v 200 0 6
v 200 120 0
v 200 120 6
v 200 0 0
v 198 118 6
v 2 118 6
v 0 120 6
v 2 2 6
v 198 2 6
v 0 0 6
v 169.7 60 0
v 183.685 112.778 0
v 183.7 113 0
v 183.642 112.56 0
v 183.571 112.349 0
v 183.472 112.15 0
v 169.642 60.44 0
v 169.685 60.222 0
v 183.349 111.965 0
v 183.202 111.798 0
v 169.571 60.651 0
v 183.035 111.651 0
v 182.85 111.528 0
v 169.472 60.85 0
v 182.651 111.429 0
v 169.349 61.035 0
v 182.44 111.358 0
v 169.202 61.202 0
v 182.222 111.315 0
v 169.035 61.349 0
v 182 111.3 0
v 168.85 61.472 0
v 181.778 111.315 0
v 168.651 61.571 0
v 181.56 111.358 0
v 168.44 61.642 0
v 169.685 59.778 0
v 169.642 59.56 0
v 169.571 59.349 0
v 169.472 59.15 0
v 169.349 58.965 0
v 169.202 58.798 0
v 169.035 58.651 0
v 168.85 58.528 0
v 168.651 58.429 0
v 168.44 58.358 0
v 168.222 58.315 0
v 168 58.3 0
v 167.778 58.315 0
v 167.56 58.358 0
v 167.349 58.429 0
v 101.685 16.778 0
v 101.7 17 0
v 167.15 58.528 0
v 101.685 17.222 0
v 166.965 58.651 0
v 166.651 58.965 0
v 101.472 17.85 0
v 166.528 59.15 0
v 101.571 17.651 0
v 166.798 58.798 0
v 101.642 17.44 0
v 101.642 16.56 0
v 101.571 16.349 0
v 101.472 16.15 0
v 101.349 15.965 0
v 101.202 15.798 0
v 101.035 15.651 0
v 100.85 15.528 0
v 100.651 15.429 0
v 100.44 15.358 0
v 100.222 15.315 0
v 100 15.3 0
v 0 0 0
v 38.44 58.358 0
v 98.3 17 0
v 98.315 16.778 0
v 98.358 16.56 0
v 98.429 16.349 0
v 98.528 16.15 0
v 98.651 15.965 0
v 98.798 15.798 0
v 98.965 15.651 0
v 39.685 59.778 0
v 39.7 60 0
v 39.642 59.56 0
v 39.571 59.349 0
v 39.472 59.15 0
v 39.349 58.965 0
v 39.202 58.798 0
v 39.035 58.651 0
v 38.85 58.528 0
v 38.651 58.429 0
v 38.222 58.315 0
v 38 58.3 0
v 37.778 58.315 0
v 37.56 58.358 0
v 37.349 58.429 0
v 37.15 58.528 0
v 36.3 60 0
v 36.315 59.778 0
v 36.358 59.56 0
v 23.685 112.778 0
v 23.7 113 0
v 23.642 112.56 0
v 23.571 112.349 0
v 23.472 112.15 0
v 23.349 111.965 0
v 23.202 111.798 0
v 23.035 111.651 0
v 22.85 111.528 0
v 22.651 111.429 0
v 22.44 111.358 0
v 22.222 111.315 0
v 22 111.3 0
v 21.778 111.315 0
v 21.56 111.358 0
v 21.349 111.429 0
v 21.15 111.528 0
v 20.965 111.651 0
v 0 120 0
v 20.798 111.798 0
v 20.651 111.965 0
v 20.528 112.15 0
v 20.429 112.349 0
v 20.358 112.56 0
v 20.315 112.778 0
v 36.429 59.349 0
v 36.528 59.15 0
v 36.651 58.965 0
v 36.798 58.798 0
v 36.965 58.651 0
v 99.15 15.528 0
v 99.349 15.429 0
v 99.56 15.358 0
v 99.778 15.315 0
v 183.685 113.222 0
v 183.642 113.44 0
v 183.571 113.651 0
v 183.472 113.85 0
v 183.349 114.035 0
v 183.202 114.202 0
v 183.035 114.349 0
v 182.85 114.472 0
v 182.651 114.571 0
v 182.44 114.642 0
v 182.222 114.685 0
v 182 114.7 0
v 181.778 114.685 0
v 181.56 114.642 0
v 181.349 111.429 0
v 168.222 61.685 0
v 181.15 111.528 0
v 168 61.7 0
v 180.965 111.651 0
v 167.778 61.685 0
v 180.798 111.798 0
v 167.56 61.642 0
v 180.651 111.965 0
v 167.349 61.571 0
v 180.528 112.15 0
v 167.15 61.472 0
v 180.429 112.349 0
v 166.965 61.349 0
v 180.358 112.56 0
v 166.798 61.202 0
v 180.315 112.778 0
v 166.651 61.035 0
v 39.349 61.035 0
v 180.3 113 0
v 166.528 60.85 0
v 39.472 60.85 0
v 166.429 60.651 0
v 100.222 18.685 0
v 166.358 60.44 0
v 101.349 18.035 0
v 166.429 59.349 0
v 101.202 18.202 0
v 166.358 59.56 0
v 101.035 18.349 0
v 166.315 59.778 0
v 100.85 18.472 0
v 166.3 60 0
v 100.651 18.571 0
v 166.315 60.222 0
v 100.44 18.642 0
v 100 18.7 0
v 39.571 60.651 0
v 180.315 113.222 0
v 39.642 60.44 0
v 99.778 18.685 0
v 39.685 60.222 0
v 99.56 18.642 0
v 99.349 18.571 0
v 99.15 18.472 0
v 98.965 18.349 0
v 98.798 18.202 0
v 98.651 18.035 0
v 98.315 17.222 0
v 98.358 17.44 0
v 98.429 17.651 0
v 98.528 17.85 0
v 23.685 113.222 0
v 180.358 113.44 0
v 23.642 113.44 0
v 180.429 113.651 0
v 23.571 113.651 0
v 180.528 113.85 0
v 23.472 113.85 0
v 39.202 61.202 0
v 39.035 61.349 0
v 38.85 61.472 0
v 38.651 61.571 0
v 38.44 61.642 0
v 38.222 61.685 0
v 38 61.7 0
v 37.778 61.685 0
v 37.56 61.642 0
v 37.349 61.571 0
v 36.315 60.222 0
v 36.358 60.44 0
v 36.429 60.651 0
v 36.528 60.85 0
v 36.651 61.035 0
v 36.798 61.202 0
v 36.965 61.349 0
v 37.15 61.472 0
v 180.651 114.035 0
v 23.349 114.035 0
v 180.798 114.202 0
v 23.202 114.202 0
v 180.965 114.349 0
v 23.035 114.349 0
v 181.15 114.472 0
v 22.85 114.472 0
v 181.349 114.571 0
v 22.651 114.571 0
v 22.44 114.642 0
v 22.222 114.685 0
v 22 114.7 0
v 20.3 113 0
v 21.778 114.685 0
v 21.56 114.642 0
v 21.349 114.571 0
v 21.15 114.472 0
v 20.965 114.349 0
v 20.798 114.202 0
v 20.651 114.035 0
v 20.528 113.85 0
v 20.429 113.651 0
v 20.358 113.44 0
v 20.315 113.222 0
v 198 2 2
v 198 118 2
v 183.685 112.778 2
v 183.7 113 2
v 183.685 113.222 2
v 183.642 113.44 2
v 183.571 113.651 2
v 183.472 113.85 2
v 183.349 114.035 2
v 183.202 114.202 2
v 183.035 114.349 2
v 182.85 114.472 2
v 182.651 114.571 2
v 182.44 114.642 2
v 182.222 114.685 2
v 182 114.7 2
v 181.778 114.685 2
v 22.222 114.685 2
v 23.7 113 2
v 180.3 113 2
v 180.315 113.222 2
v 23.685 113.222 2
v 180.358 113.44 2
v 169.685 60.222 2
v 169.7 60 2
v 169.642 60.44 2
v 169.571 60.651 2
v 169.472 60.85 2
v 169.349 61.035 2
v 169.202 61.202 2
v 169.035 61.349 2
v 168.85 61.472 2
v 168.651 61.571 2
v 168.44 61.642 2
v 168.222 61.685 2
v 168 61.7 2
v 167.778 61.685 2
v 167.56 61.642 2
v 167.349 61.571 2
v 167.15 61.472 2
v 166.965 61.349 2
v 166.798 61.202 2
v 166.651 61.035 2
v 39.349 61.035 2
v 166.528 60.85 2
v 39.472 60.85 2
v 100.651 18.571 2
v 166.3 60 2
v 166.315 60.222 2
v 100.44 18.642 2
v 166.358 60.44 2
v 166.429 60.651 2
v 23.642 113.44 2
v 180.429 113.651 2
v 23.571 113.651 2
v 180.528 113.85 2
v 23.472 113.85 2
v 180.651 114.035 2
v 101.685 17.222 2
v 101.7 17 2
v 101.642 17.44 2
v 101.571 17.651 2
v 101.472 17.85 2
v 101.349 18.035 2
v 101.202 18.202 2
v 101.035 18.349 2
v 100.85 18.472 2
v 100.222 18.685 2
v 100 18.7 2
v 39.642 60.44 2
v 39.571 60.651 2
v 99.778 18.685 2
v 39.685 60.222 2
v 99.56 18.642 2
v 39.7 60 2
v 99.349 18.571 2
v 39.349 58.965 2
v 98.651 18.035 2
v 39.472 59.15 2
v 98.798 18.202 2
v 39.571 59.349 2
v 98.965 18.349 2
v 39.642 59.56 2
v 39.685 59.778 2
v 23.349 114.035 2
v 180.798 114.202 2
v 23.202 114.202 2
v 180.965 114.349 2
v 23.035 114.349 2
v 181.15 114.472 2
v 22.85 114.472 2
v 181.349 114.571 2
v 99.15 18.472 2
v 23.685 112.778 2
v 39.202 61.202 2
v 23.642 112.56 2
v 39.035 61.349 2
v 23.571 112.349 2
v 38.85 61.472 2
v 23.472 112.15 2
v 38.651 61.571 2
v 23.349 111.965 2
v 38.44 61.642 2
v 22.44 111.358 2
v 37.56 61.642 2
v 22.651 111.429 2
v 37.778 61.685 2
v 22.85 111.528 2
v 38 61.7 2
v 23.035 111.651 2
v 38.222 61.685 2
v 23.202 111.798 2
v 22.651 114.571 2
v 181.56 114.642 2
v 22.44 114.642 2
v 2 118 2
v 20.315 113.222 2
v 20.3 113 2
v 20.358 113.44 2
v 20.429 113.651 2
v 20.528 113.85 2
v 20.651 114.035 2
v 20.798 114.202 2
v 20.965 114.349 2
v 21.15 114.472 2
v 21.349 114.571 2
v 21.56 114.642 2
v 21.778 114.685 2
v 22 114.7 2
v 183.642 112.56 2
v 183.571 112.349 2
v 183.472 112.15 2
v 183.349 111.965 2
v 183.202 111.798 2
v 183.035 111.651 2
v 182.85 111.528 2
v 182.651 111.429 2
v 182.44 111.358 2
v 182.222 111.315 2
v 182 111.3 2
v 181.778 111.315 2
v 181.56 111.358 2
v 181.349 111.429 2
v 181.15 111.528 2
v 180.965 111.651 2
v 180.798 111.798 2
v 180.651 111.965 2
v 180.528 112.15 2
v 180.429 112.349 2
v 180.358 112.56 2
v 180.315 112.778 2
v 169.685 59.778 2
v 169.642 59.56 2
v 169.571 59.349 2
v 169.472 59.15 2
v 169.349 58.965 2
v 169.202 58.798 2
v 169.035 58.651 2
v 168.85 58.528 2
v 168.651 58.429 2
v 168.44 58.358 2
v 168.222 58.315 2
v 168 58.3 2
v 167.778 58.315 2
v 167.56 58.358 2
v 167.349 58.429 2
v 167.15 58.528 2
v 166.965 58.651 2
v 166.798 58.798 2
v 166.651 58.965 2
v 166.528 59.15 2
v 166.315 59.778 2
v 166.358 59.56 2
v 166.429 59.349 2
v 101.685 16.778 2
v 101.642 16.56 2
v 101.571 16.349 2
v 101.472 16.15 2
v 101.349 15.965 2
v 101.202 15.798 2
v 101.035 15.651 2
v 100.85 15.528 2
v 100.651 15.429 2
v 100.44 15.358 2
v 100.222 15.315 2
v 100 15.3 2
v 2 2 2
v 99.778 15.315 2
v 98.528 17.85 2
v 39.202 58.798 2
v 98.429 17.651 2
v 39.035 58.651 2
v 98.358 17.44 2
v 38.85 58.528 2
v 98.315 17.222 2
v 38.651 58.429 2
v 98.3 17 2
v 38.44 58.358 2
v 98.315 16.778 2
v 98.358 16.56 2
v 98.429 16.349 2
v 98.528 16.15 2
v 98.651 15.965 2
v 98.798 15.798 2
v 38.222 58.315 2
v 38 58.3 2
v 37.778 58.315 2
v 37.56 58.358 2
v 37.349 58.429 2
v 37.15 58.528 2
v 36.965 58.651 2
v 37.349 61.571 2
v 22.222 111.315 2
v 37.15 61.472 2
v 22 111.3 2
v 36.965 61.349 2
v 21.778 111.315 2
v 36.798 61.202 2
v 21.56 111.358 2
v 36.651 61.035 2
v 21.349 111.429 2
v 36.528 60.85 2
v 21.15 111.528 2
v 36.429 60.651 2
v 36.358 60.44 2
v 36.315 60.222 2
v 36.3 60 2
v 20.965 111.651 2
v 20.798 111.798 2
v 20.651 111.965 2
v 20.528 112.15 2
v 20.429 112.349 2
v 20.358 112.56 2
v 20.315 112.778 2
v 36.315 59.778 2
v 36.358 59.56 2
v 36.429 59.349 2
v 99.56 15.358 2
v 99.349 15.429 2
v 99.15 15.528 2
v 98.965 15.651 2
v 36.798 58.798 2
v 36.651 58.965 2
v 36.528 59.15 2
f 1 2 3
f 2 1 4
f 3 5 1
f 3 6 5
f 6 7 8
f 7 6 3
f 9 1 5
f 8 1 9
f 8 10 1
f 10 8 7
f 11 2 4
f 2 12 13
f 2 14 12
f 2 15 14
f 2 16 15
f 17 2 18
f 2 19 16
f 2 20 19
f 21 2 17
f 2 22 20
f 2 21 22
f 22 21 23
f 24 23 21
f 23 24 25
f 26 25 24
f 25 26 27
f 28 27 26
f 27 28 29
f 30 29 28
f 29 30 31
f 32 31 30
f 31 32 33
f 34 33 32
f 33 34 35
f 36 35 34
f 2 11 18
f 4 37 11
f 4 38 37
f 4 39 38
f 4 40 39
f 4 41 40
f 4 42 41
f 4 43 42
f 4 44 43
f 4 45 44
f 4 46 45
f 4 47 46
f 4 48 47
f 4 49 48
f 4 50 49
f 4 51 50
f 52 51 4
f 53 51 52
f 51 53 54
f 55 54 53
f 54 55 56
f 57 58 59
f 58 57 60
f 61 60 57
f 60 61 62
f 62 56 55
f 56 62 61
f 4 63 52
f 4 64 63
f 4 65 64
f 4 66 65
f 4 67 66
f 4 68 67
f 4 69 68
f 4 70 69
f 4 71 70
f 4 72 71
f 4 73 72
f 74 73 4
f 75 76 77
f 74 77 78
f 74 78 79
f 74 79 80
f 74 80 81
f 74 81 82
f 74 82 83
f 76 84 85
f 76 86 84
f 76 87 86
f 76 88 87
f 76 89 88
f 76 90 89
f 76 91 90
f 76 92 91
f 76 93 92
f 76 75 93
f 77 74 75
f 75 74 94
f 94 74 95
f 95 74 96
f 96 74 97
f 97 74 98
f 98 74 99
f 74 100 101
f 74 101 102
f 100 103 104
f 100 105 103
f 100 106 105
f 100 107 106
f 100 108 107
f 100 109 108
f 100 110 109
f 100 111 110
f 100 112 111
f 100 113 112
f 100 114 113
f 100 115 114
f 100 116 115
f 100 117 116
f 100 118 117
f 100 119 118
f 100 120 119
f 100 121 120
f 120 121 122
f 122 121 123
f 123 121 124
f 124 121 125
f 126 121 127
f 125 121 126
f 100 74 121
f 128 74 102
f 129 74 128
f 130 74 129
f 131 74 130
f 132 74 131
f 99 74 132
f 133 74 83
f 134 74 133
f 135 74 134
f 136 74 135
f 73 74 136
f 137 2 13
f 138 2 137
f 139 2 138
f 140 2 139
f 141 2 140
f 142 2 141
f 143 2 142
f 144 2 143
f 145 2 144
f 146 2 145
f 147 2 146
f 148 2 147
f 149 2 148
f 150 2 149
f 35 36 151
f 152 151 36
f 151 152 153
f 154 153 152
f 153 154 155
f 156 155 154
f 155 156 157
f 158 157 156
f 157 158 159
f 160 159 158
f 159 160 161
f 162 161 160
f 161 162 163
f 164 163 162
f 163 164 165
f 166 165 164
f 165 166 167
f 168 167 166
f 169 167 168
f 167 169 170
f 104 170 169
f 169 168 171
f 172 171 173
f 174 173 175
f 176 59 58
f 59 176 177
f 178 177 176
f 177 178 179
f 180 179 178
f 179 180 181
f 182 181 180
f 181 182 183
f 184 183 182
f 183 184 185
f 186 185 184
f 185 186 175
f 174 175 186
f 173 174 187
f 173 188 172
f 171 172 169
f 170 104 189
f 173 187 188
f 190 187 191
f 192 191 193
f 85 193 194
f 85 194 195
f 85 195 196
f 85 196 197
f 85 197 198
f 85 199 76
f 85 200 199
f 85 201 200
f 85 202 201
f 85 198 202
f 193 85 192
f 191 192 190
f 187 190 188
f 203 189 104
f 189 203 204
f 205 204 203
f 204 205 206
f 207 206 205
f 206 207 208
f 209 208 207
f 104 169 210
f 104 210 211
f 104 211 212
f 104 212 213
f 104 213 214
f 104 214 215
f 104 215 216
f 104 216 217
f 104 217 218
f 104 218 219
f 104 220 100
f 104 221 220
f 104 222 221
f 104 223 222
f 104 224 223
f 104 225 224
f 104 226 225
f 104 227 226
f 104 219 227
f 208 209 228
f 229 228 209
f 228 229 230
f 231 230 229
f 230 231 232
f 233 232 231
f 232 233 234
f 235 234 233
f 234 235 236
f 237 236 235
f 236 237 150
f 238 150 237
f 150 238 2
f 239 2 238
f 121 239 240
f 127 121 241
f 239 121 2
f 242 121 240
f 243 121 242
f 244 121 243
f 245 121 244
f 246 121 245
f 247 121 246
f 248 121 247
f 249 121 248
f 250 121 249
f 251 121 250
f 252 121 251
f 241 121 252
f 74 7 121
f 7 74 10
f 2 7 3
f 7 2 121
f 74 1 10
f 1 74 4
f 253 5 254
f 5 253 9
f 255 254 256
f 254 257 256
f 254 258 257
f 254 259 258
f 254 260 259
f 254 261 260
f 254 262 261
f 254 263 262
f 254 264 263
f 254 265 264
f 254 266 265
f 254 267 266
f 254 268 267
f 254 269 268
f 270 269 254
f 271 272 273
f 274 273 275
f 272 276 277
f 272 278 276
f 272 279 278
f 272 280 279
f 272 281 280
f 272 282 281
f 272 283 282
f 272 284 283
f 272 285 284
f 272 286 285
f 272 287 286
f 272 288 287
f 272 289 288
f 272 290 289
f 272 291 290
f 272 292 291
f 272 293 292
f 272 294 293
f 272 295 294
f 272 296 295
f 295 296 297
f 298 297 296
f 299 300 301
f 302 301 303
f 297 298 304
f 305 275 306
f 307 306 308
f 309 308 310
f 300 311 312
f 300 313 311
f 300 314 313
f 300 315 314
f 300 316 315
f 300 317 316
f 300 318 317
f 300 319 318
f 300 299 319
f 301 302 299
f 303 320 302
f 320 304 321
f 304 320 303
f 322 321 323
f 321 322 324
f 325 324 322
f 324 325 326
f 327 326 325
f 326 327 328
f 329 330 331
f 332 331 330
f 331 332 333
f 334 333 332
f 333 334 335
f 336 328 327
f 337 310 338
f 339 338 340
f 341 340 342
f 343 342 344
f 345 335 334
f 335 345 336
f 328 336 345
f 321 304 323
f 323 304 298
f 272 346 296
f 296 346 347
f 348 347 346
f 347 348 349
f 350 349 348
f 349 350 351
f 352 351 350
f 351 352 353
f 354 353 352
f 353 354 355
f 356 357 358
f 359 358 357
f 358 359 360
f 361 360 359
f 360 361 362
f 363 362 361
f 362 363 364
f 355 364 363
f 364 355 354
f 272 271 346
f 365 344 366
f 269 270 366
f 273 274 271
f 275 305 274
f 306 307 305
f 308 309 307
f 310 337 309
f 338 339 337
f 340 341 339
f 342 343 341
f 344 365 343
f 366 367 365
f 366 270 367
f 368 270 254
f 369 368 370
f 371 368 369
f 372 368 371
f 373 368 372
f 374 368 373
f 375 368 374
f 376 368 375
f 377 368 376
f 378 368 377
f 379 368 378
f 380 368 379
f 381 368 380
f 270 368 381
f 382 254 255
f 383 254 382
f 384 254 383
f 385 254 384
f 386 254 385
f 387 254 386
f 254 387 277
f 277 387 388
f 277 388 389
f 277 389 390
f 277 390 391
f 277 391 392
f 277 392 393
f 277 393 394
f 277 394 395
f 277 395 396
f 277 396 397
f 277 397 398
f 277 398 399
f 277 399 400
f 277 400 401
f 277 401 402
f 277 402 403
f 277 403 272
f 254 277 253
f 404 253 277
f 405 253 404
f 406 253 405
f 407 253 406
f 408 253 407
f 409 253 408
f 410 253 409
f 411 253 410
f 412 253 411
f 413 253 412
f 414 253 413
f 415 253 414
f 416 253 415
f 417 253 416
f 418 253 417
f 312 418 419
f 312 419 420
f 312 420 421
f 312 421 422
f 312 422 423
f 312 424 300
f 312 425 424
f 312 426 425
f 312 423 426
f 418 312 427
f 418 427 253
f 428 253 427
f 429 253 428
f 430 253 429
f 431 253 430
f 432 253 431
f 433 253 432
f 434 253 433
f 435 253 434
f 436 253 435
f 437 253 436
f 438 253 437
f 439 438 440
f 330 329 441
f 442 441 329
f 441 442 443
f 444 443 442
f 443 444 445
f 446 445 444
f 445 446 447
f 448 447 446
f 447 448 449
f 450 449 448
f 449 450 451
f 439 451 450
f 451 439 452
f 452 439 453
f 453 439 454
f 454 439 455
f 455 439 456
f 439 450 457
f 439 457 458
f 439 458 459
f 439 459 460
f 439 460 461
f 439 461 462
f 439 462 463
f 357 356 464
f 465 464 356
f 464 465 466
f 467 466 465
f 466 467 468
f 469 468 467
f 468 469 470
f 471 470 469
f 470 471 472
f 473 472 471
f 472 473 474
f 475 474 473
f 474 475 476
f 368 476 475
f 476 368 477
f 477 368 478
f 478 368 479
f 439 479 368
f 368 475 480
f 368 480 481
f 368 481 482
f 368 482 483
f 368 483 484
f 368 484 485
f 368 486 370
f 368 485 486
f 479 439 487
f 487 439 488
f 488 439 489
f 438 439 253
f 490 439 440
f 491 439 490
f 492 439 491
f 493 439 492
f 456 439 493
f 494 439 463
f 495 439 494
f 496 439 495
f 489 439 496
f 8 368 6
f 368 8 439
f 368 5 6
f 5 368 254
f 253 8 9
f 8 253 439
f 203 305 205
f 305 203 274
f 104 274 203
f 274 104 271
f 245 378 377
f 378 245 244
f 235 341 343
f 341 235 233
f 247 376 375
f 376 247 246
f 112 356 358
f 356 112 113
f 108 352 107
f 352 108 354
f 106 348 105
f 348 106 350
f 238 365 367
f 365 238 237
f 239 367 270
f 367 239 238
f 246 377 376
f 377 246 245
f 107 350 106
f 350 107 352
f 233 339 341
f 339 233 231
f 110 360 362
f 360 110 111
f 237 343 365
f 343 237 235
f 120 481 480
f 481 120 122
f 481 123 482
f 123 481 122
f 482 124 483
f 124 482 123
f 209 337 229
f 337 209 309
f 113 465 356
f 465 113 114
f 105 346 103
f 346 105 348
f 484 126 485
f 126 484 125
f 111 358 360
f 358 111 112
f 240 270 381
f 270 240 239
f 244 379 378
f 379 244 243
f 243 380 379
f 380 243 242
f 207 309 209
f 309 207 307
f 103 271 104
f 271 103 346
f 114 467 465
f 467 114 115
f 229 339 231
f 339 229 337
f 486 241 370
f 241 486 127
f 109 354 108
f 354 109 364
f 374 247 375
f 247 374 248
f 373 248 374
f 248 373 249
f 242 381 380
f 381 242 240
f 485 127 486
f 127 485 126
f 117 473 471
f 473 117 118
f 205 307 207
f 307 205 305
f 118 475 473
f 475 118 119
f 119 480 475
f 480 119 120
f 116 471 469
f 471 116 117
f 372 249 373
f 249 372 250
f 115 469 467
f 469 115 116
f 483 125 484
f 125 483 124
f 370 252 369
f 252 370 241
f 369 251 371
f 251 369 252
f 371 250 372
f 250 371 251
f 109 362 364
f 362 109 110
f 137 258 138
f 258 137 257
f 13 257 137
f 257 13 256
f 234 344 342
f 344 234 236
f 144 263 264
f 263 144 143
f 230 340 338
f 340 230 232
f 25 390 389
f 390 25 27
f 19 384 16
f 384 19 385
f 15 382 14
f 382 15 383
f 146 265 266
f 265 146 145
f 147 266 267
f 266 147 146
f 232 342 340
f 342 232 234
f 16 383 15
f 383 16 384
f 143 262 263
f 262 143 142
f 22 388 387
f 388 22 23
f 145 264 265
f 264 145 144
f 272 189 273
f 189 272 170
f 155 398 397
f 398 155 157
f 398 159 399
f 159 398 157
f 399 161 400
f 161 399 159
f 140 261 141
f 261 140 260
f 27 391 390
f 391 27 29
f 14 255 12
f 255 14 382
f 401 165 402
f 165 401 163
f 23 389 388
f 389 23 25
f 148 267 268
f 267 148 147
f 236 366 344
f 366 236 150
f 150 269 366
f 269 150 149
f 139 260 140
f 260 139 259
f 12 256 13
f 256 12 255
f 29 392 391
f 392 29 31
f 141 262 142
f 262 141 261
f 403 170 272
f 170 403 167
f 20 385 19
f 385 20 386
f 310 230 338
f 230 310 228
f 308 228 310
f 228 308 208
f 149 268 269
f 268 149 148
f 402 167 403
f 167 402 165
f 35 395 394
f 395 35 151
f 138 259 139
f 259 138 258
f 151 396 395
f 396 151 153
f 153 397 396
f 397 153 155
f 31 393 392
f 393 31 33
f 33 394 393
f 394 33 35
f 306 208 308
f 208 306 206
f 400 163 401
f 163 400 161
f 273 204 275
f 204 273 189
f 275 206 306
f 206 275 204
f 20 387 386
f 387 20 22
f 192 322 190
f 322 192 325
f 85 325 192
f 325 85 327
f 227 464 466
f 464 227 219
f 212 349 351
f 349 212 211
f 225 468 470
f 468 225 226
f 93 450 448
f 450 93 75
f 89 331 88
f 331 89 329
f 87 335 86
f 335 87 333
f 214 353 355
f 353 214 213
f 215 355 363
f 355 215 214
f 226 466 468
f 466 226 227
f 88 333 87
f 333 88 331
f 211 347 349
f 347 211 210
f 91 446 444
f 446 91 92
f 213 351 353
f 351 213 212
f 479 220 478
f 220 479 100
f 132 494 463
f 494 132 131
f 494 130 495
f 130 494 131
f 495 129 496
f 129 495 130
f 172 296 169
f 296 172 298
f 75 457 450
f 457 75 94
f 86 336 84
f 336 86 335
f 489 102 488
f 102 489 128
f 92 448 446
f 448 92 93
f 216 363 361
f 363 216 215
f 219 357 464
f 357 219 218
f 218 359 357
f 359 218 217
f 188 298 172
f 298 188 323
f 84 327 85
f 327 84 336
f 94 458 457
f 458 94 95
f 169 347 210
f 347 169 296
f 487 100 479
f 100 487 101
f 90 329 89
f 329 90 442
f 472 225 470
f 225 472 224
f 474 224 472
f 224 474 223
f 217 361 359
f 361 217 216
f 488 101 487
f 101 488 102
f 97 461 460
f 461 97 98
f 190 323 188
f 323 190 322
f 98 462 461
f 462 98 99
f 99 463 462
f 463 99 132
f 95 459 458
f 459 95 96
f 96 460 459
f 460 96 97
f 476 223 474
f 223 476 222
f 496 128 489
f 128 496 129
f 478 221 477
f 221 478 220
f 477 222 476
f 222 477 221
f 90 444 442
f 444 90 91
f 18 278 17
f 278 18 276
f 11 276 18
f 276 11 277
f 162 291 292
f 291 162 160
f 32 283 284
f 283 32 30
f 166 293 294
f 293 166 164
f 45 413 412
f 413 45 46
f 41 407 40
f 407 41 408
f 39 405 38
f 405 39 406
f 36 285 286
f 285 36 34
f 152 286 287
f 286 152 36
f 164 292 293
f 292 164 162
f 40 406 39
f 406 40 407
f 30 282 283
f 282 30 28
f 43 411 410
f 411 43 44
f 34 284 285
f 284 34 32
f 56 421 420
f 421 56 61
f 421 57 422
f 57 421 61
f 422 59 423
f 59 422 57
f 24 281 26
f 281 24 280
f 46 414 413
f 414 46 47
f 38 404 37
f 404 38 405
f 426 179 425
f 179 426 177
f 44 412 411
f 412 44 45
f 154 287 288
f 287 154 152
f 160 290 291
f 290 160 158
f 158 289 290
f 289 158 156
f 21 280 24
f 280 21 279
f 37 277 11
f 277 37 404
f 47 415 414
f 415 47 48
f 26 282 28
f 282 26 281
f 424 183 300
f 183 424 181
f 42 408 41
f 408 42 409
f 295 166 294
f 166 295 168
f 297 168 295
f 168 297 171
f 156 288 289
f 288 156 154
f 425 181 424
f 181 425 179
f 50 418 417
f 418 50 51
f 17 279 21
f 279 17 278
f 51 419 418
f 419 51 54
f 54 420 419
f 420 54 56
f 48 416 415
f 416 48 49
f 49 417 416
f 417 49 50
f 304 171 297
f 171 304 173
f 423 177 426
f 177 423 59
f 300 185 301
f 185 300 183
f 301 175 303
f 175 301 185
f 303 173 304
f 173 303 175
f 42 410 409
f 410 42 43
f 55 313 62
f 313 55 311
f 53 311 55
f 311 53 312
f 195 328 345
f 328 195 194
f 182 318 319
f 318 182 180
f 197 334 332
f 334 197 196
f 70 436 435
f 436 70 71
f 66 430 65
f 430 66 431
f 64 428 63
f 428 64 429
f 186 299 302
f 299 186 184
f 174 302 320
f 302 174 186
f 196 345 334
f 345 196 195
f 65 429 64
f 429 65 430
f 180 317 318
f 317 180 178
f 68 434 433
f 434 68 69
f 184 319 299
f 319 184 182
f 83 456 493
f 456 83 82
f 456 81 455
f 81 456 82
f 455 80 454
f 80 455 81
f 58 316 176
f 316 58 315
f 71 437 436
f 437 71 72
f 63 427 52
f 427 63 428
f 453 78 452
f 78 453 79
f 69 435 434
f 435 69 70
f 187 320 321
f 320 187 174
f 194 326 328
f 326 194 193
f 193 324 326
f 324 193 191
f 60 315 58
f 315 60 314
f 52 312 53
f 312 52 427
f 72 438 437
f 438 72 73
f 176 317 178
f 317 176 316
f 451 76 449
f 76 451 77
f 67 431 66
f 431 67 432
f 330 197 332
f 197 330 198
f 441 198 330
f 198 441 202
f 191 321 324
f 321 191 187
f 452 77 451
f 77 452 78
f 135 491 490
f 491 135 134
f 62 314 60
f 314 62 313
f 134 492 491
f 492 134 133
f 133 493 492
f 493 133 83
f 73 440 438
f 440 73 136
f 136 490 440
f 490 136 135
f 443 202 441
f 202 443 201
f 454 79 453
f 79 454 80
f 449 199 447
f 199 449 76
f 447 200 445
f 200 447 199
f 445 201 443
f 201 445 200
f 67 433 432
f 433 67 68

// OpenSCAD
// Assembly — Portacosas
// Each declared part rendered in its ASSEMBLED position on the tray.
// render_mode: 0=tray_base, 1=pen_holder, 2=phone_stand,
//              3=card_slot, 4=cable_clip, 5=label_plate
//
// The platform renders one part at a time, dispatched by render_mode/target_part
// (hyperobjects-spec rules.render_targets: "a mode listing three parts is three
// renders"). This file previously drew every component unconditionally, so all six
// declared parts rendered the identical six-component scene. Two consequences the
// render sweep caught:
//
//   1. Every part's mesh was the same scene, so no part was actually its own body.
//   2. The components' hardcoded tray placements INTERSECT each other at every
//      parameter point — at the defaults the card slot (x 55..145) runs through the
//      pen holder (x 7..79) and caps pen bores 3 and 4, which then export as sealed
//      voids: the -476.1203 and -952.2404 mm3 inverted shells CI reported. The same
//      collision recurs, with different numbers, at all five presets.
//
// Rendering one part per render removes both: a part is its own solid, and two
// components are never in the same mesh to intersect. `use` (not `include`) keeps
// desk_organizer.scad's own top-level selector from firing and drawing a second,
// stray tray_base at the origin.
//
// Placement is unchanged from the original layout — this file positions, it does
// not resize. Parameter ids, ranges, defaults and presets are all untouched.

use <desk_organizer.scad>

// --- Parameters (mirrored from desk_organizer.scad; -D still overrides) ---
render_mode = 0;

tray_width = 200;
tray_depth = 120;
wall_height = 80;
wall_thickness = 2.0;

pen_count = 5;
pen_diameter = 12;
pen_style = false;

phone_width = 75;
phone_angle = 65;
charging_slot = true;

card_width = 90;
card_depth = 60;
card_angle = 10;

clip_count = 2;
clip_diameter = 6;

label_text = "YANTRA4D";
label_depth = 0.5;

rows = 1;
cols = 1;

$fn = 48;

// --- Derived (mirrored) ---
base_h = wall_thickness;
pen_holder_d = pen_diameter + wall_thickness * 2;

// `use` does not import variables, so every call passes the parameters the
// component needs explicitly. desk_organizer.scad's modules take them as
// arguments defaulting to its own globals, so a plain call still works there.
module _tray_base() {
    tray_base(tray_width=tray_width, tray_depth=tray_depth,
              wall_thickness=wall_thickness, clip_count=clip_count);
}

module _pen_holder() {
    translate([wall_thickness + 5, (tray_depth - pen_holder_d) / 2, base_h])
        pen_holder(pen_count=pen_count, pen_diameter=pen_diameter,
                   pen_style=pen_style, wall_thickness=wall_thickness,
                   wall_height=wall_height);
}

module _phone_stand() {
    translate([tray_width - wall_thickness - phone_width - 5,
               (tray_depth - 40 - wall_thickness) / 2, base_h])
        phone_stand(phone_width=phone_width, wall_height=wall_height,
                    wall_thickness=wall_thickness, charging_slot=charging_slot);
}

module _card_slot() {
    translate([(tray_width - card_width) / 2, wall_thickness + 2, base_h])
        card_slot(card_width=card_width, card_depth=card_depth,
                  wall_height=wall_height, wall_thickness=wall_thickness);
}

// The mode declares part_quantities.cable_clip = clip_count, so this part is
// clip_count bodies by design — the clips print as separate pieces. The manifest
// declares that count; see verification.mode_overrides.
module _cable_clips() {
    for (i = [0 : clip_count - 1]) {
        cx = wall_thickness + 20 + i * (tray_width - 40) / max(clip_count - 1, 1);
        translate([cx, tray_depth - wall_thickness - 15, base_h])
            cable_clip(clip_diameter=clip_diameter, wall_thickness=wall_thickness);
    }
}

module _label_plate() {
    translate([(tray_width - tray_width * 0.4) / 2, 0, base_h + 4])
        label_plate(tray_width=tray_width, wall_thickness=wall_thickness,
                    label_text=label_text, label_depth=label_depth);
}

// --- Render mode dispatch: one branch per declared part ---
if (render_mode == 0) {
    _tray_base();
} else if (render_mode == 1) {
    _pen_holder();
} else if (render_mode == 2) {
    _phone_stand();
} else if (render_mode == 3) {
    _card_slot();
} else if (render_mode == 4) {
    _cable_clips();
} else if (render_mode == 5) {
    _label_plate();
}
